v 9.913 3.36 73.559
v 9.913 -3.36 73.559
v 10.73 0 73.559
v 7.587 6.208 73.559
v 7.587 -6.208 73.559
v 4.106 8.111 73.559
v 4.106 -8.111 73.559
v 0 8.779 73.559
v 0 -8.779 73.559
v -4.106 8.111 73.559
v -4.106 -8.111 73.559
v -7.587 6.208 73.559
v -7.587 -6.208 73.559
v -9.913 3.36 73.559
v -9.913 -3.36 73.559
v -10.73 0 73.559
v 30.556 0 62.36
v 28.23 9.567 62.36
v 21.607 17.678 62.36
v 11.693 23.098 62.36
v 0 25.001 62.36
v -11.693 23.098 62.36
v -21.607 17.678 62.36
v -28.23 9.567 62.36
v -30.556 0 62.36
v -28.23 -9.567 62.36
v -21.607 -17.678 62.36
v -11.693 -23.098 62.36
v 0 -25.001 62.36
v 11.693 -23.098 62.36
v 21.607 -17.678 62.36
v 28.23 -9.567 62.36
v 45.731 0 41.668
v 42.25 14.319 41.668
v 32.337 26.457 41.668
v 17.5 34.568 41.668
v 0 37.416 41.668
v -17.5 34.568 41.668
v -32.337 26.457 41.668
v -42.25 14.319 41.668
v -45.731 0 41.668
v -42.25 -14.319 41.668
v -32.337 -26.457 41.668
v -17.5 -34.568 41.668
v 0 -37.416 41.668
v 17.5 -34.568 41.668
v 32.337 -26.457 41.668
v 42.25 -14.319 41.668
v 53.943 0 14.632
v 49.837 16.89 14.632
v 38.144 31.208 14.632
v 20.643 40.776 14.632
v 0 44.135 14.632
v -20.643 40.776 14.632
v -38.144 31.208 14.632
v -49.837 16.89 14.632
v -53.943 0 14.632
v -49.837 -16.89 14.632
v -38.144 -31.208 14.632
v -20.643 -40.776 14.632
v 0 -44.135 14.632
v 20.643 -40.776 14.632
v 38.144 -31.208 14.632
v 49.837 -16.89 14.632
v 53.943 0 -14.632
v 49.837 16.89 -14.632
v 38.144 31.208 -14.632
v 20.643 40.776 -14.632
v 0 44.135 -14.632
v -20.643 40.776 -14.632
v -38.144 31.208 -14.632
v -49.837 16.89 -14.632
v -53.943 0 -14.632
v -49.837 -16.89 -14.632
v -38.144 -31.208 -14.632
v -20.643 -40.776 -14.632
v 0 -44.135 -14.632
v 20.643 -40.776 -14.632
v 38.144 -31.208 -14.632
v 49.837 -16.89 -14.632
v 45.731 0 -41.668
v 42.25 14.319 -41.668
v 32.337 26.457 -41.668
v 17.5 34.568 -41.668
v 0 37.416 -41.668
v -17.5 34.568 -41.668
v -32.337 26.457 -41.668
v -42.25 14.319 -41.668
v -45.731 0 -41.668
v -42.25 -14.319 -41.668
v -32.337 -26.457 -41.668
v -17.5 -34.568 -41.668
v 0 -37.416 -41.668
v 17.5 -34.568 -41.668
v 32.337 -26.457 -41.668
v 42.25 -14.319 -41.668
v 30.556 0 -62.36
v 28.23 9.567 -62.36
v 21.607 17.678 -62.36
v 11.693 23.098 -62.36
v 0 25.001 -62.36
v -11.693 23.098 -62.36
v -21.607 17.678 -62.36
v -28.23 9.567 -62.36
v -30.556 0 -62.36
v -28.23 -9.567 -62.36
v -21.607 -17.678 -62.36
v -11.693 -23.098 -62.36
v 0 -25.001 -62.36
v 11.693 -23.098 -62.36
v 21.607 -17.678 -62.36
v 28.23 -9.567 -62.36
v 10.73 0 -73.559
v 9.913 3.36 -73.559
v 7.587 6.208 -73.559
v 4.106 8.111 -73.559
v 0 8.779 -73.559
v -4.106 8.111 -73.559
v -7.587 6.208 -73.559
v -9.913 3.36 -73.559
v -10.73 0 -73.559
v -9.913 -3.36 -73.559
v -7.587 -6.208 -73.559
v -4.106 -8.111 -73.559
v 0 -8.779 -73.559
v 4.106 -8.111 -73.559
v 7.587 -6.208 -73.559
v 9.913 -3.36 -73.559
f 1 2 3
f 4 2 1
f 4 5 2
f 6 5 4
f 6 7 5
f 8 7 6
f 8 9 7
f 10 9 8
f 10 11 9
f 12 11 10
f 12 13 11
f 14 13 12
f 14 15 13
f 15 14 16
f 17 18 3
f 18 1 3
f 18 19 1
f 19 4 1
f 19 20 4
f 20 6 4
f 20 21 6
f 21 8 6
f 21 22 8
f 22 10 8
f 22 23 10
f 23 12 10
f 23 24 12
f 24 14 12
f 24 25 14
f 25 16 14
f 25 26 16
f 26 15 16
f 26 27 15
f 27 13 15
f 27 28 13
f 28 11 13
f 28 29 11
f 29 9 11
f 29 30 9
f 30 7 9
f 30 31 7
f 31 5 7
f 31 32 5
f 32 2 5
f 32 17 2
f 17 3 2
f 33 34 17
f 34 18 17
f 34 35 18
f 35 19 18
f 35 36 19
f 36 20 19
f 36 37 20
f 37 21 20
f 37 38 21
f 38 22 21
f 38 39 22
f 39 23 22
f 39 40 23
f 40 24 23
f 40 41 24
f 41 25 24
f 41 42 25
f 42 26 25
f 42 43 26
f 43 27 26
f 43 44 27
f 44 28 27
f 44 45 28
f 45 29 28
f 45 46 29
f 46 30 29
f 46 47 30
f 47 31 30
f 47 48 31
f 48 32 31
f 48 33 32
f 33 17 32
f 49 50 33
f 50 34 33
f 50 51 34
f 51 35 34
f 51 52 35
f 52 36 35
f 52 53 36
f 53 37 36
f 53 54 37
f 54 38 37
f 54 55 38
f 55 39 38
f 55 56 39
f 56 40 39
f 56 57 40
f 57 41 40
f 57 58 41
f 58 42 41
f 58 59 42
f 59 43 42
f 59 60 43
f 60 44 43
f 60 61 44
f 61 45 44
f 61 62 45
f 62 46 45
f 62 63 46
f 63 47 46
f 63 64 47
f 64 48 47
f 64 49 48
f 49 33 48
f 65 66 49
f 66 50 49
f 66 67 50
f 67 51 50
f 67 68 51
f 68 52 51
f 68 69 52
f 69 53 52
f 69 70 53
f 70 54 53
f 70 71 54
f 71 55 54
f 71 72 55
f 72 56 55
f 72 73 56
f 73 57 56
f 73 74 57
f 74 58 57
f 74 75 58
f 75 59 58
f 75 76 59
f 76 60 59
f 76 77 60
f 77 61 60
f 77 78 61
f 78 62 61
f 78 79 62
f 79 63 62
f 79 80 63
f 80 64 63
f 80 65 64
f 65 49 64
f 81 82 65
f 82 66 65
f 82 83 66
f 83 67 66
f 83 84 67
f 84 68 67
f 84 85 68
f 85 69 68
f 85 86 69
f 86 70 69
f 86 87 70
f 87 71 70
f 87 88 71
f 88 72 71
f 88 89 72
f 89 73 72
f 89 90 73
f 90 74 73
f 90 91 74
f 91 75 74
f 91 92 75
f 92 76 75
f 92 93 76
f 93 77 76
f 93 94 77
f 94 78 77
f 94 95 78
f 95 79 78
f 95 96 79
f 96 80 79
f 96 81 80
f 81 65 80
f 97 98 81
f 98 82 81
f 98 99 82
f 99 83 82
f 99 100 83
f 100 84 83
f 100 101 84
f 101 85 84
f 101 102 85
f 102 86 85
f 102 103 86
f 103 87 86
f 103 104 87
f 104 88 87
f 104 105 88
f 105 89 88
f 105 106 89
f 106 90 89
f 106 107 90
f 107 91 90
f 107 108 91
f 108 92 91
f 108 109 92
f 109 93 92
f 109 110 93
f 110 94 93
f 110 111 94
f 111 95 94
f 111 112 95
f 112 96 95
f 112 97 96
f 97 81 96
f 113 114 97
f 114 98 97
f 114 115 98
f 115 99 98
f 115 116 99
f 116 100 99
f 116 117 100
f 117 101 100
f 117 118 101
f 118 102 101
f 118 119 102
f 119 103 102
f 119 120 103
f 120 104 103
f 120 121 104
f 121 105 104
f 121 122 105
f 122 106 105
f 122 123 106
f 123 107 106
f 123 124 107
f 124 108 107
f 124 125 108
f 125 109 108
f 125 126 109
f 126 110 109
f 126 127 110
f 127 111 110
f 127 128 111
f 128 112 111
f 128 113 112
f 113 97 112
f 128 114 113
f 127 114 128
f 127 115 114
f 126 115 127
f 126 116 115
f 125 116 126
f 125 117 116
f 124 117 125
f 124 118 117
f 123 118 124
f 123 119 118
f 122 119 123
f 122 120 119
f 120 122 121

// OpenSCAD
// Generated by SolidPython 1.0.1 on 2020-07-29 00:46:49


scale(v = [11, 9, 15]) {
	sphere(r = 5);
}
/***********************************************
*********      SolidPython code:      **********
************************************************
 
# import packages: SolidPython
from solid import *
from solid.utils import *
from itertools import chain, combinations, permutations


class Resize:

    def __init__(self, scad_file):
        self.scad_file = scad_file
        #self.scad_file = import_scad(scad_file)
        # cone/cylinder param:
        self.r1 = 0
        self.r2 = 0
        self.h = 0
        # rectangular prism param:
        self.w = 0
        self.l = 0
        # ellipse param:
        self.r = 0

    # import OpenScad code (file name corresponds to shape)


    # classify shape + parameters
    def assign(self, param1, param2, param3):
        if self.scad_file == 'cone.scad':
            self.r1 = param1
            self.r2 = param2
            self.h = param3
        elif self.scad_file == 'cylinder.scad':
            self.r1 = param1
            self.r2 = param2
            self.h = param3
        elif self.scad_file == 'rectangularPrism.scad':
            self.h = param1
            self.l = param2
            self.w = param3
        else:
            self.r = param1
            self.h = param2

    # resize parameters
    def iterate(self):
        x = range(3, 20, 2)
        i = 1
        if self.scad_file == 'cone.scad':
            tempList = list(permutations(x, 2))
            for temp in tempList:
                param1 = temp[0]
                param2 = temp[1]
                filepath = 'produced_scad_files/' + 'cone' + str(param1) + '_' + str(param2) + '_' + '.scad'
                scad_render_to_file(cylinder(h=param1, r1=param2, r2=0), filepath)

        elif self.scad_file == 'cylinder.scad':
            tempList = list(permutations(x, 3))
            for temp in tempList:
                param1 = temp[0]
                param2 = temp[1]
                filepath = 'produced_scad_files/' + 'cylinder' + str(param1) + '_' + str(param2) + '_' + '.scad'
                scad_render_to_file(cylinder(h=param1, r1=param2, r2=param2), filepath)

        elif self.scad_file == 'rectangularPrism.scad':
            tempList = list(permutations(x, 3))
            for temp in tempList:
                param1 = temp[0]
                param2 = temp[1]
                param3 = temp[2]
                filepath = 'produced_scad_files/' + 'rectangularPrism' + str(param1) + '_' + str(param2) + '_' + str(
                    param3) + '.scad'
                scad_render_to_file(cube(size=(param1, param2, param3)), filepath)

        elif self.scad_file == 'ellipse.scad':
            tempList = list(permutations(x, 4))
            for temp in tempList:
                param1 = temp[0]
                param2 = temp[1]
                param3 = temp[2]
                param4 = temp[3]
                filepath = 'produced_scad_files/' + 'ellipse' + str(param1) + '_' + str(param2) + '_' + str(param3) + '_' + str(param4) + '.scad'
                scad_render_to_file(scale([param1, param2, param3])(sphere(r=param4)), filepath)

    def render_to_scadfile(self):
        scad_render_to_file(scad, 'example.scad') 
 
************************************************/
